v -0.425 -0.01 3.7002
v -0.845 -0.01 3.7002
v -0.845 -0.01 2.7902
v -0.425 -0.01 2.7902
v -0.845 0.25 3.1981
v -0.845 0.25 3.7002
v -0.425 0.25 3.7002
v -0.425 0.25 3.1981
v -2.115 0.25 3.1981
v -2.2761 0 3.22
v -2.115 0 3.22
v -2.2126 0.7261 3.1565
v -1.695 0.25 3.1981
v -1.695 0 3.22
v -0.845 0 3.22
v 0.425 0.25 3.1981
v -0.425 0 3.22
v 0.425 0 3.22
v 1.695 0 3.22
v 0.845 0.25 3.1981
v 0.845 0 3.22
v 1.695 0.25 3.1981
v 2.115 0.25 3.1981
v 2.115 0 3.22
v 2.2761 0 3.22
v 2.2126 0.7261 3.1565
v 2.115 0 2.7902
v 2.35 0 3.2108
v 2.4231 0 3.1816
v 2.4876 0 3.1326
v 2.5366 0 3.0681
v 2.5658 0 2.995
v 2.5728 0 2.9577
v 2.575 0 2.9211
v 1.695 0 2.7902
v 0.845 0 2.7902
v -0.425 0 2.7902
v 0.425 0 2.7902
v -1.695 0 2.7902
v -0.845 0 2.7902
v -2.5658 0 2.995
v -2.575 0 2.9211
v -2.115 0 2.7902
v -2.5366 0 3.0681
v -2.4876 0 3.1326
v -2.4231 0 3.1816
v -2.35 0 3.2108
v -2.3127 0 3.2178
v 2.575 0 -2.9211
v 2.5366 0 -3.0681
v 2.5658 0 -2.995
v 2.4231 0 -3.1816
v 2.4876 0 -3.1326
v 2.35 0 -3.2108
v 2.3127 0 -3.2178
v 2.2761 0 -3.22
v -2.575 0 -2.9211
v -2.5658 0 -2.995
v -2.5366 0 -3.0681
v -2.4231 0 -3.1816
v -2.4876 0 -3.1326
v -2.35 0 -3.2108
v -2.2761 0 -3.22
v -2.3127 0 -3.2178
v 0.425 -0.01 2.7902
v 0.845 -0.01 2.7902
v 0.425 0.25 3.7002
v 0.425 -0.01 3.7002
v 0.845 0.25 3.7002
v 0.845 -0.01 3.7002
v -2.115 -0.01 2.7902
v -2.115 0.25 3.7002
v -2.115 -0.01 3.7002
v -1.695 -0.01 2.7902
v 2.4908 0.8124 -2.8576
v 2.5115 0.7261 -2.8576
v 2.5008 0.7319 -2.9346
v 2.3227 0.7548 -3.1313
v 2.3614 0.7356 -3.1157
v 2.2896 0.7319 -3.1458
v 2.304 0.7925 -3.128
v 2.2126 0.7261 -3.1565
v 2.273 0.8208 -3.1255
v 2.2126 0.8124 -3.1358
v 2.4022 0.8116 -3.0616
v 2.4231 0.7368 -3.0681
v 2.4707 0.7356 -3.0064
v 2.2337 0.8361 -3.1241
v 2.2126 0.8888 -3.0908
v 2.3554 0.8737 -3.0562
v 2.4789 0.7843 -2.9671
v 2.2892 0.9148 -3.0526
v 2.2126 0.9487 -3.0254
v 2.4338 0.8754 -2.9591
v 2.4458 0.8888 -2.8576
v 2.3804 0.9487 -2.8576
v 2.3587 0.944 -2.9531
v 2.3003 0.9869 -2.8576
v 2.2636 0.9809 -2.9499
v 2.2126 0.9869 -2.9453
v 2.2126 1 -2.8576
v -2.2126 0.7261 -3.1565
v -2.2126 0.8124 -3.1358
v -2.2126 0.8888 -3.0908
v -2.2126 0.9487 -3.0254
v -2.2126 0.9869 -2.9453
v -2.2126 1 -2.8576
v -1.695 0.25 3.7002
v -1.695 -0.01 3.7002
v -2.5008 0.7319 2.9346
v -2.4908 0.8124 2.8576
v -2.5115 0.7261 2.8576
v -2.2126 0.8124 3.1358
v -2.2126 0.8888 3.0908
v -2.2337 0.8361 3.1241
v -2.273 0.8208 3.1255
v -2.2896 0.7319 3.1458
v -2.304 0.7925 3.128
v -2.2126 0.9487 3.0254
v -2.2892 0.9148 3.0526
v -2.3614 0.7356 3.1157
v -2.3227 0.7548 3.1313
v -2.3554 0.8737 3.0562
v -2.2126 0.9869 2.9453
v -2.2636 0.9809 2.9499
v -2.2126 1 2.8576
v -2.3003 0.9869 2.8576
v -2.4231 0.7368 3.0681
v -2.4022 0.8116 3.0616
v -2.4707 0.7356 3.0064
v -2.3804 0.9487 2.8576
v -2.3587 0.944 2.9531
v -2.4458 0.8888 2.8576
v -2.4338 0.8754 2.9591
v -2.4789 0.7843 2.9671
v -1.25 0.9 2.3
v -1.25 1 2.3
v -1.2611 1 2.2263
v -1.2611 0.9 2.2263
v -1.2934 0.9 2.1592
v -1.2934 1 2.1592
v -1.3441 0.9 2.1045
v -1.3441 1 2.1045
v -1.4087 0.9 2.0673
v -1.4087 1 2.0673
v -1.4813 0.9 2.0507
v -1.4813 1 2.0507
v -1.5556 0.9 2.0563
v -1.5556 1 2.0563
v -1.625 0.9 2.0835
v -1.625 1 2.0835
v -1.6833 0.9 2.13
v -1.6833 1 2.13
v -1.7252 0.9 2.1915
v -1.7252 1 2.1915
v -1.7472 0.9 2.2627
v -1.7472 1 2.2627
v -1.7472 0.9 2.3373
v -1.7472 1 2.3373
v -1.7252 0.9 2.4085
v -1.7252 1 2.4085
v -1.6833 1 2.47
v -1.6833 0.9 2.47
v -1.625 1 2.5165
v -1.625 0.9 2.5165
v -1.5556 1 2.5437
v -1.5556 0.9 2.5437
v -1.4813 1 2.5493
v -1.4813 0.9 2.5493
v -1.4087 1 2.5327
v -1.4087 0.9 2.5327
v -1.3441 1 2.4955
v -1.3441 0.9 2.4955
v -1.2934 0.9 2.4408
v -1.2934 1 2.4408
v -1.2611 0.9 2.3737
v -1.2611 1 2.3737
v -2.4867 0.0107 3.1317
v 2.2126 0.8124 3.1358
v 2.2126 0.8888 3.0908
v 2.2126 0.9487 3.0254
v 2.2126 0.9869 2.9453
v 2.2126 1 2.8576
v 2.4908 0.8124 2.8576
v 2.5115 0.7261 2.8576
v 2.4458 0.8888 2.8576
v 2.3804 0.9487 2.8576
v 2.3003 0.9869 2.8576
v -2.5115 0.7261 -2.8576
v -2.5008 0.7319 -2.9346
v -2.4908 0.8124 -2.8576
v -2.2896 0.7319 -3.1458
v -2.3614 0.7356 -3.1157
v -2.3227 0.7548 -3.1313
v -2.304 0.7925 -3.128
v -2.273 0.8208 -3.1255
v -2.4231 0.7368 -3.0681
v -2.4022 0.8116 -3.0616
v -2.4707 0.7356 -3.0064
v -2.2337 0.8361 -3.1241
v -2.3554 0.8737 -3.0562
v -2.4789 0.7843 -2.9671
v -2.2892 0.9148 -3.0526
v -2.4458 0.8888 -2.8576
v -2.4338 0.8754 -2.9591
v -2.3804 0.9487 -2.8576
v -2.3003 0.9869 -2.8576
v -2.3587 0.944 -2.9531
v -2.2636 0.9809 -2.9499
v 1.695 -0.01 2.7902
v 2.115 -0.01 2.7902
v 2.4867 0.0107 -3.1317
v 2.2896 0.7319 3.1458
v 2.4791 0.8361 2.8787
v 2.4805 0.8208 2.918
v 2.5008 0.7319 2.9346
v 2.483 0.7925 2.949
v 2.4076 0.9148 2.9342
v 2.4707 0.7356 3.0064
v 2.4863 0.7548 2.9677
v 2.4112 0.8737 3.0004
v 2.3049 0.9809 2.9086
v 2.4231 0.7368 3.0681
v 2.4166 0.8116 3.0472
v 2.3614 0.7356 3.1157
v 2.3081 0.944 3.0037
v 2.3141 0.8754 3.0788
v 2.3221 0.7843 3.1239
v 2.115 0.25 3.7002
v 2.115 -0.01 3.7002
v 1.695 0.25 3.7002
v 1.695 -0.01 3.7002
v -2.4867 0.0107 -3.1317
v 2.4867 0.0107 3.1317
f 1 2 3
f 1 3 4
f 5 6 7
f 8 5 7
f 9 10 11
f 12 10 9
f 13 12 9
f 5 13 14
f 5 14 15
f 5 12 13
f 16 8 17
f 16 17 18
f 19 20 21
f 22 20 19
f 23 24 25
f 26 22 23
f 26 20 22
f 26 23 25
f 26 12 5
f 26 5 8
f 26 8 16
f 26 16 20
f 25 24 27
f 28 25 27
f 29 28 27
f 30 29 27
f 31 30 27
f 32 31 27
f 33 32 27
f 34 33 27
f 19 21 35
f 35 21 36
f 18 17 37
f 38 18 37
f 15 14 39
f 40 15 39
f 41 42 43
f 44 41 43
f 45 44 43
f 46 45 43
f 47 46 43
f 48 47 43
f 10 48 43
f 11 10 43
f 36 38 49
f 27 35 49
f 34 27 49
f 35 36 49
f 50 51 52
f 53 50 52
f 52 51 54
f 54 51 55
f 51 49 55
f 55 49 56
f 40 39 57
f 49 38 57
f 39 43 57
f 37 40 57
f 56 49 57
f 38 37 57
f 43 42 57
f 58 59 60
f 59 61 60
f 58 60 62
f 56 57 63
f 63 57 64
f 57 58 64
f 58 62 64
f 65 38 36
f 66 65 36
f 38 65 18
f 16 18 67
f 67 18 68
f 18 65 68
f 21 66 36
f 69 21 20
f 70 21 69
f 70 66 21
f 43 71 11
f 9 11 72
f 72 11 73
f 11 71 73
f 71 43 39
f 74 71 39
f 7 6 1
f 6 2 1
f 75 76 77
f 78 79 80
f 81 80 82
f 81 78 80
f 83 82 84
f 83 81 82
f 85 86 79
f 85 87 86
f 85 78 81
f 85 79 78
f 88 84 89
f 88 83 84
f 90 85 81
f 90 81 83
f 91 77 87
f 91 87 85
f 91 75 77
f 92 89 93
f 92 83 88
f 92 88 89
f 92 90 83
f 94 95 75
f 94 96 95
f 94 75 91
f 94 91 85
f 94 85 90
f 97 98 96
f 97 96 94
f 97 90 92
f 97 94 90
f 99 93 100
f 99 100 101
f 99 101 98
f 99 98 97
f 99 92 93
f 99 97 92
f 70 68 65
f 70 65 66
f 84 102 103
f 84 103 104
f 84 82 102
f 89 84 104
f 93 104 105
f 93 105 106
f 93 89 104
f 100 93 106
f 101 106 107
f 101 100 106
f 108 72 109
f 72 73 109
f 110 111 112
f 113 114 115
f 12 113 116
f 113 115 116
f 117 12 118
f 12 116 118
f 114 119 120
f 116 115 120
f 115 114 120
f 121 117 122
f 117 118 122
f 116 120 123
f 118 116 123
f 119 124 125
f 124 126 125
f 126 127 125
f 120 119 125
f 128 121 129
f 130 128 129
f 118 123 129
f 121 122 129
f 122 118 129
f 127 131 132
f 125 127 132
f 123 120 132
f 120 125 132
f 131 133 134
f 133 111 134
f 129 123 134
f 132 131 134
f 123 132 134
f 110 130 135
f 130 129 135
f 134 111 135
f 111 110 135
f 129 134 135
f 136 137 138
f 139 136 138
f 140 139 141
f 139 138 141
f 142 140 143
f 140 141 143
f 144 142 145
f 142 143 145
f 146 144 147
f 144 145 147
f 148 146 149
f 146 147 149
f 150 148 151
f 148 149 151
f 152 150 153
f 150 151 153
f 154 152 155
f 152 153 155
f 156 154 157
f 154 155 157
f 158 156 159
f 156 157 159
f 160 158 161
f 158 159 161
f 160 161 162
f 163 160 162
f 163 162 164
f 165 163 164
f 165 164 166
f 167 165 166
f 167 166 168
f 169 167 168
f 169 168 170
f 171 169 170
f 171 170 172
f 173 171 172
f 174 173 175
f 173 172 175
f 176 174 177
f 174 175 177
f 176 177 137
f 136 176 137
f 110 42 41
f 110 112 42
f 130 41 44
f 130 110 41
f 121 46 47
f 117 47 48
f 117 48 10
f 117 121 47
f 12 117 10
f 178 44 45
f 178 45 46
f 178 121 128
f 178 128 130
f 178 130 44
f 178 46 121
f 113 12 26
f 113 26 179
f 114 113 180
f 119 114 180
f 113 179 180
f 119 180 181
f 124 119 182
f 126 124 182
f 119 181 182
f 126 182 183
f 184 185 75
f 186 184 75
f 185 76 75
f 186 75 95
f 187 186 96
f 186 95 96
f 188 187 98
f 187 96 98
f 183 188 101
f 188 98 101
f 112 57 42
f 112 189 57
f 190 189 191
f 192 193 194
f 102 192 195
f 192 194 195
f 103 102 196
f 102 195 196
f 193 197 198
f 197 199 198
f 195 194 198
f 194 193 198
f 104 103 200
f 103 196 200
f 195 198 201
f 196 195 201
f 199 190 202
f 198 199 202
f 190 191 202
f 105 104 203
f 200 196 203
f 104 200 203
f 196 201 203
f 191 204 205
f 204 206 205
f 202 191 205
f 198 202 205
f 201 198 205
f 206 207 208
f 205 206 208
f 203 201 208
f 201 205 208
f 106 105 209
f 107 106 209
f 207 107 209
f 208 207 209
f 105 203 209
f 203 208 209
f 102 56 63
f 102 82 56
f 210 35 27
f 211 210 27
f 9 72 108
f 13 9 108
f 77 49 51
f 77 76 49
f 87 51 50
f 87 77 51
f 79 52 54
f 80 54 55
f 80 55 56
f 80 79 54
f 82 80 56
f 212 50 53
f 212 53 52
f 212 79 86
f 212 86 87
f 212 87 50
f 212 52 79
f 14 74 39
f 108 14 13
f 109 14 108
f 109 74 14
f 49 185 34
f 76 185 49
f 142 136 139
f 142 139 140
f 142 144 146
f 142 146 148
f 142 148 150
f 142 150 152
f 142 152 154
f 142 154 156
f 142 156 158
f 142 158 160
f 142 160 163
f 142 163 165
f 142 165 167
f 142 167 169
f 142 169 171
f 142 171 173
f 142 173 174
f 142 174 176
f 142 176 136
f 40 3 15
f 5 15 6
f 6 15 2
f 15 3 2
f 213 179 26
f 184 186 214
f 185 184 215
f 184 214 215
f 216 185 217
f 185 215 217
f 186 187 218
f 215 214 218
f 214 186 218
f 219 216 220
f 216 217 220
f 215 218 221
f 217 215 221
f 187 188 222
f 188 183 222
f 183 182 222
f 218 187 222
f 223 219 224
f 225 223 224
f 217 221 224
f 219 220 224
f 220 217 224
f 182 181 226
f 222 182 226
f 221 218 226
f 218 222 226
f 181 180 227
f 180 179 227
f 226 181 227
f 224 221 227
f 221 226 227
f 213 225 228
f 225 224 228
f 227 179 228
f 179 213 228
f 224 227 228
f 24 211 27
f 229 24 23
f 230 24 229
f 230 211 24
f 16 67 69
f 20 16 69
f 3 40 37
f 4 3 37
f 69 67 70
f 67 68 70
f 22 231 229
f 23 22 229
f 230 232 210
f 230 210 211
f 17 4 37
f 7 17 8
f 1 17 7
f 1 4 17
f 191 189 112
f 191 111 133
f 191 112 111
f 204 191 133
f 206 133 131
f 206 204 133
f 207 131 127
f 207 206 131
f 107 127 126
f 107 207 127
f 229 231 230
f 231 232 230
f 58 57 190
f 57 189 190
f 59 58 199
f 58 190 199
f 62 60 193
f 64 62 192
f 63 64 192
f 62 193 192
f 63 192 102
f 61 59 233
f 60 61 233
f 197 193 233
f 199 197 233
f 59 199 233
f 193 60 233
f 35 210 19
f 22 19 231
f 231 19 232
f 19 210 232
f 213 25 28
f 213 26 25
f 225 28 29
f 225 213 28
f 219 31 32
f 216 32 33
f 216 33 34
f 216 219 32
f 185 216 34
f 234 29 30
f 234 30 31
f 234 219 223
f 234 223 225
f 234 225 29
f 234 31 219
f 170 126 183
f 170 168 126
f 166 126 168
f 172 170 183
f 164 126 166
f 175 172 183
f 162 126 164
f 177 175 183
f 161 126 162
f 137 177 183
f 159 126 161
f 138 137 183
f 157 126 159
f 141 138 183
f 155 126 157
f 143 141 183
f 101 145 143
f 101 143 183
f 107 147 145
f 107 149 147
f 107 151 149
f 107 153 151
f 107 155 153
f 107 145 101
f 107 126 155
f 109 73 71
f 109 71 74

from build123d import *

# Parameters (mm, degrees)
SKETCH_1_W           = 5.15
SKETCH_1_H           = 6.44
EXTRUDE_1_DEPTH      = 1
EXTRUDE_1_TAPER      = 5
FILLET_1_R           = 0.3
SKETCH_2_R           = 0.25
CUT_EXTRUDE_1_DEPTH  = 0.1
SKETCH_3_W           = 0.42
SKETCH_3_H           = 0.91
EXTRUDE_2_DEPTH      = 0.01
EXTRUDE_2_DEPTH_BACK = 0.25


with BuildPart() as part:
    # Эскиз1 → Бобышка-Вытянуть1 (new body)
    with BuildSketch(Plane(origin=(0, 0, 0), x_dir=(1, 0, 0), z_dir=(0, 1, 0))):
        Rectangle(SKETCH_1_W, SKETCH_1_H)
    extrude(amount=EXTRUDE_1_DEPTH, taper=EXTRUDE_1_TAPER)

    # Скругление1
    fillet_1_edges = [part.edges().sort_by_distance(p)[0] for p in [
        (-2.487511336, 1, 0),
        (0, 1, 3.132511336),
        (2.487511336, 1, 0),
        (2.531255668, 0.5, 3.176255668),
        (-2.531255668, 0.5, 3.176255668),
        (-2.531255668, 0.5, -3.176255668),
        (2.531255668, 0.5, -3.176255668),
        (0, 1, -3.132511336),
    ]]
    fillet(fillet_1_edges, radius=FILLET_1_R)

    # Эскиз2 → Вырез-Вытянуть1 (cut)
    with BuildSketch(Plane(origin=(0, 1, 0), x_dir=(1, 0, 0), z_dir=(0, 1, 0))):
        with Locations((-1.5, -2.3)):
            Circle(SKETCH_2_R)
    extrude(amount=-CUT_EXTRUDE_1_DEPTH, mode=Mode.SUBTRACT)

    # Эскиз3 → Бобышка-Вытянуть2 (add, two sides)
    with BuildSketch(Plane.XZ) as extrude_2_sk:
        with Locations((-0.635, 3.245234577)):
            Rectangle(SKETCH_3_W, SKETCH_3_H)
        with Locations((1.905, 3.245234577)):
            Rectangle(SKETCH_3_W, SKETCH_3_H)
        with Locations((0.635, 3.245234577)):
            Rectangle(SKETCH_3_W, SKETCH_3_H)
        with Locations((-1.905, 3.245234577)):
            Rectangle(SKETCH_3_W, SKETCH_3_H)
    extrude(amount=EXTRUDE_2_DEPTH)
    extrude(extrude_2_sk.sketch, amount=-EXTRUDE_2_DEPTH_BACK)


solid = part.part
